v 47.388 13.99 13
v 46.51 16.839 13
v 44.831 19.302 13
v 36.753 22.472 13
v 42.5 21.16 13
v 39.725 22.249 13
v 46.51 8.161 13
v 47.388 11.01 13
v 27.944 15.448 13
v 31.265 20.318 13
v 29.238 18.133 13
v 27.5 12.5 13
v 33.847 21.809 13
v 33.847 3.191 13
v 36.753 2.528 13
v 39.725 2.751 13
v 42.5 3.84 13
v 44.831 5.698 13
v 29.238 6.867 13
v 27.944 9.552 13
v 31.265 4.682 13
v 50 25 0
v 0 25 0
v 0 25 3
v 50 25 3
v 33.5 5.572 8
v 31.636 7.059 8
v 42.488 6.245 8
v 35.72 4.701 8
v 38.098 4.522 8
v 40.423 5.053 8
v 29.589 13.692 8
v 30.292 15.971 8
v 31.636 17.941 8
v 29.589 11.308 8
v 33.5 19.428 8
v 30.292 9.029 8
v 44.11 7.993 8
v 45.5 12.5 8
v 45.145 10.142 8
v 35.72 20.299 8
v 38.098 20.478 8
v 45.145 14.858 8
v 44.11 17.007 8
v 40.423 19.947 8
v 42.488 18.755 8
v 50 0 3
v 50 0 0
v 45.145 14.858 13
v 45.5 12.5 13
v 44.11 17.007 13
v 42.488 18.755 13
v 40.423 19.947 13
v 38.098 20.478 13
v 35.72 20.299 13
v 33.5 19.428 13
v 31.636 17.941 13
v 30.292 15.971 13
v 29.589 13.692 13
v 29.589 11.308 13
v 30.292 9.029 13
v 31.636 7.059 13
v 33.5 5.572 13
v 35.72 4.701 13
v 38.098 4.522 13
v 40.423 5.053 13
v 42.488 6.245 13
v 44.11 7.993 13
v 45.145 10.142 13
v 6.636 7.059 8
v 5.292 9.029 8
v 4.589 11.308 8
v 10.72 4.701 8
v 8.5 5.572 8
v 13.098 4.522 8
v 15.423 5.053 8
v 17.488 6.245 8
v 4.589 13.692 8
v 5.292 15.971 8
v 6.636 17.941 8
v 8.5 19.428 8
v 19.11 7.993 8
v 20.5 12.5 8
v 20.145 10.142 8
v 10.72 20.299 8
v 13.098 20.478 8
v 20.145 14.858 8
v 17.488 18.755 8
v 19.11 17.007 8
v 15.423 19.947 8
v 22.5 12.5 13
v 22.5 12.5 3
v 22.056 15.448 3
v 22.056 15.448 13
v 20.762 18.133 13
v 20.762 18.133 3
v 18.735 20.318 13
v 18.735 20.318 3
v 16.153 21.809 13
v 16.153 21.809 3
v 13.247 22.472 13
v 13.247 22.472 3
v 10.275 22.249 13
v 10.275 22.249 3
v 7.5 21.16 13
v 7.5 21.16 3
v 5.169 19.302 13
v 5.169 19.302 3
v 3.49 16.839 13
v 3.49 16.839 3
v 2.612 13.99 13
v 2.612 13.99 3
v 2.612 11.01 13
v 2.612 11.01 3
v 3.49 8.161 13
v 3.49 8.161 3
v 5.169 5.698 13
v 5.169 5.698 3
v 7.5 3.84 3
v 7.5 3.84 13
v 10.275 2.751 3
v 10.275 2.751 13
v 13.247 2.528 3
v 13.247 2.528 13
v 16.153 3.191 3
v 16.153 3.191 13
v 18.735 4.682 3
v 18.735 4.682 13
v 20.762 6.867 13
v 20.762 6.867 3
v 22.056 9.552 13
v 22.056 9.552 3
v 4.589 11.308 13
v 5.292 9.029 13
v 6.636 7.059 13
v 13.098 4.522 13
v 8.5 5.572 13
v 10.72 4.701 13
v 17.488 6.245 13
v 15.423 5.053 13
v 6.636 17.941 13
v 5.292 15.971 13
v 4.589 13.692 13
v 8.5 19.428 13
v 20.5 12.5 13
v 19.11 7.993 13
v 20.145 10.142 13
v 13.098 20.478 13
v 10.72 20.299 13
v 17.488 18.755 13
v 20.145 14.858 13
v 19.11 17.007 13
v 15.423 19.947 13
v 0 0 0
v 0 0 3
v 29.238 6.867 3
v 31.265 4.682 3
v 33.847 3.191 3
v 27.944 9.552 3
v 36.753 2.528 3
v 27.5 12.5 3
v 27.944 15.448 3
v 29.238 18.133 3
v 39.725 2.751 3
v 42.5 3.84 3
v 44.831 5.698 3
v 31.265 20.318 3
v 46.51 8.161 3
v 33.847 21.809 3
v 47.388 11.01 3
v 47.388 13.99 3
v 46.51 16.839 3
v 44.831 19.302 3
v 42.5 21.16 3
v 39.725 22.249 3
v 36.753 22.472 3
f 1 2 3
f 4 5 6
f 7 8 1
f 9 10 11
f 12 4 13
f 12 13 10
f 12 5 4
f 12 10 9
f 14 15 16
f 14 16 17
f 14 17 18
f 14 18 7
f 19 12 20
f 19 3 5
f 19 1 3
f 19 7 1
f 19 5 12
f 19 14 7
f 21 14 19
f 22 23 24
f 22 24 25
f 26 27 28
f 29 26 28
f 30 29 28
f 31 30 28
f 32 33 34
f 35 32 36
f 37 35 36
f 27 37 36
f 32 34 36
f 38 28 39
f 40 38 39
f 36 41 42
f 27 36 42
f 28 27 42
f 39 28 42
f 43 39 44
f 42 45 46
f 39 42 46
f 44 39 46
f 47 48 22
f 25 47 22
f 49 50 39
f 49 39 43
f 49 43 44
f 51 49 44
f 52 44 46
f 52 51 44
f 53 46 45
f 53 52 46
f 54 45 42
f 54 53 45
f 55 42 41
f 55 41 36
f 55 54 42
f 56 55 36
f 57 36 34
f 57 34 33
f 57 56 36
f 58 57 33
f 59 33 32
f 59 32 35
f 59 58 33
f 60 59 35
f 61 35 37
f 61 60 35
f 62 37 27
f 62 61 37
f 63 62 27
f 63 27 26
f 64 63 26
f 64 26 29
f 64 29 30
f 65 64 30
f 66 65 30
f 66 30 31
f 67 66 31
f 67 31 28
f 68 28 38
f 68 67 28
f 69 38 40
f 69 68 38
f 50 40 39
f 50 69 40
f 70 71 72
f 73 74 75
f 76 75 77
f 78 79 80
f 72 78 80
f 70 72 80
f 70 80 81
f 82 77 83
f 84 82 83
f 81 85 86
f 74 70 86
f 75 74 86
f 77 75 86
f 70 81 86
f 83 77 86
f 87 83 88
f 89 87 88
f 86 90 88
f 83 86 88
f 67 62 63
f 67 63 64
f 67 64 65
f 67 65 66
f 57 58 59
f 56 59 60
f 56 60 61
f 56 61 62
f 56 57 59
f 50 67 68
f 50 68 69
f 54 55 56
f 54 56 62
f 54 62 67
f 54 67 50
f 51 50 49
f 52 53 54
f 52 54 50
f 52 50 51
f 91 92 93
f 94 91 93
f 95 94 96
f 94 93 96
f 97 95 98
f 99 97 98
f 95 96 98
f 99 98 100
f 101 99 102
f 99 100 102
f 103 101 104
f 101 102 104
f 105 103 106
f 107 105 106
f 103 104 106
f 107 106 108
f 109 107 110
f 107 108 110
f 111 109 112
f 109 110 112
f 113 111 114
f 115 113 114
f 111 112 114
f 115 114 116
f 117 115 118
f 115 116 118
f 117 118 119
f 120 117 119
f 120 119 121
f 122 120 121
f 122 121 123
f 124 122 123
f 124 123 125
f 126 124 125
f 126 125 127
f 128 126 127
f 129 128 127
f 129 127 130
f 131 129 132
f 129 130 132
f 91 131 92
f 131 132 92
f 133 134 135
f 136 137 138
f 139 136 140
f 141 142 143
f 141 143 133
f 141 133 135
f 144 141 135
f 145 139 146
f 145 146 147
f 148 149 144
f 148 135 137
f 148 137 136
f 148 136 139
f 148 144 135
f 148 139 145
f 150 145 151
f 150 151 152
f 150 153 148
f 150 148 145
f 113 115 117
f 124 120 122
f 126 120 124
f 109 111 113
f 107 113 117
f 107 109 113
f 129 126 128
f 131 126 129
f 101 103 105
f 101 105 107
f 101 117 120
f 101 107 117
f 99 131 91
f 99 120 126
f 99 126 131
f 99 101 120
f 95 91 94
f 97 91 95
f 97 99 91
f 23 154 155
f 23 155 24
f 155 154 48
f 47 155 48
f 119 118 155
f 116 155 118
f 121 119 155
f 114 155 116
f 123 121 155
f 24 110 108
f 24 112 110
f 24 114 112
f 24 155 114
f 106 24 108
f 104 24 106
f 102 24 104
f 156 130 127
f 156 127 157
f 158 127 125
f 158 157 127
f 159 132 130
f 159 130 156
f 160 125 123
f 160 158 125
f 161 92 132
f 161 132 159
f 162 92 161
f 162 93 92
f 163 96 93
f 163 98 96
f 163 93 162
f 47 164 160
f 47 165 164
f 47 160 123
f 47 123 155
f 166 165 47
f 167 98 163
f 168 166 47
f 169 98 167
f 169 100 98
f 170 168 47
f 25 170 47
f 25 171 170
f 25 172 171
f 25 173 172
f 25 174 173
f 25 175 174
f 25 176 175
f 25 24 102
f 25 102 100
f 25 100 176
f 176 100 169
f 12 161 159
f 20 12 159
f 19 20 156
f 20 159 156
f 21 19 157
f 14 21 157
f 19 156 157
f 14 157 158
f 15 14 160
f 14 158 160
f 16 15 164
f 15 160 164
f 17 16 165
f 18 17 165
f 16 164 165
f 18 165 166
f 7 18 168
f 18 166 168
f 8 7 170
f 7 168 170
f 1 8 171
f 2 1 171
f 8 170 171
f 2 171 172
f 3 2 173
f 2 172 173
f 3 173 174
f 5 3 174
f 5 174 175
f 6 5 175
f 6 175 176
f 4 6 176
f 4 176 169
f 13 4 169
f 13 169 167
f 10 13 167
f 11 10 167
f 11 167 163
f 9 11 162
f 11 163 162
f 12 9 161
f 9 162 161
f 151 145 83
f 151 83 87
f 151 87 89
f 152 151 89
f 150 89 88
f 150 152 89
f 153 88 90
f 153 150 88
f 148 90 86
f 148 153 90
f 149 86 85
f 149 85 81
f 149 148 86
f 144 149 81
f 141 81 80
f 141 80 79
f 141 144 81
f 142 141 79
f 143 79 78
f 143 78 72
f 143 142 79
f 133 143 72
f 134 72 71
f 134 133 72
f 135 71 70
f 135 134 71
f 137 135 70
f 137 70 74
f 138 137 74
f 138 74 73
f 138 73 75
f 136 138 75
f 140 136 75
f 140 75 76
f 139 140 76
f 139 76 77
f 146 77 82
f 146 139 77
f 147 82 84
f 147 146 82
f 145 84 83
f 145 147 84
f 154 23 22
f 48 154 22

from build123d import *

# Parameters (mm, degrees)
SKETCH_1_W      = 50
SKETCH_1_H      = 25
EXTRUDE_1_DEPTH = 3
SKETCH_2_R      = 10
EXTRUDE_2_DEPTH = 10
SKETCH_3_R      = 8
EXTRUDE_3_DEPTH = 5
SKETCH_4_R      = 8
EXTRUDE_4_DEPTH = 5


with BuildPart() as part:
    # 草图1 → 凸台-拉伸1 (new body)
    with BuildSketch(Plane.XY):
        with Locations((25, 12.5)):
            Rectangle(SKETCH_1_W, SKETCH_1_H)
    extrude(amount=EXTRUDE_1_DEPTH)

    # 草图2 → 凸台-拉伸2 (add)
    with BuildSketch(Plane.XY.offset(3)):
        with Locations((12.5, 12.5)):
            Circle(SKETCH_2_R)
        with Locations(Location((37.5, 12.5, 0), (0, 0, 180))):
            Circle(SKETCH_2_R)
    extrude(amount=EXTRUDE_2_DEPTH)


with BuildPart() as body_2:
    # 草图3 → 凸台-拉伸3 (new body)
    with BuildSketch(Plane.XY.offset(13)):
        with Locations((12.5, 12.5)):
            Circle(SKETCH_3_R)
    extrude(amount=-EXTRUDE_3_DEPTH)


with BuildPart() as body_3:
    # 草图4 → 凸台-拉伸4 (new body)
    with BuildSketch(Plane.XY.offset(13)):
        with Locations((37.5, 12.5)):
            Circle(SKETCH_4_R)
    extrude(amount=-EXTRUDE_4_DEPTH)


solid = Compound([part.part, body_2.part, body_3.part])
